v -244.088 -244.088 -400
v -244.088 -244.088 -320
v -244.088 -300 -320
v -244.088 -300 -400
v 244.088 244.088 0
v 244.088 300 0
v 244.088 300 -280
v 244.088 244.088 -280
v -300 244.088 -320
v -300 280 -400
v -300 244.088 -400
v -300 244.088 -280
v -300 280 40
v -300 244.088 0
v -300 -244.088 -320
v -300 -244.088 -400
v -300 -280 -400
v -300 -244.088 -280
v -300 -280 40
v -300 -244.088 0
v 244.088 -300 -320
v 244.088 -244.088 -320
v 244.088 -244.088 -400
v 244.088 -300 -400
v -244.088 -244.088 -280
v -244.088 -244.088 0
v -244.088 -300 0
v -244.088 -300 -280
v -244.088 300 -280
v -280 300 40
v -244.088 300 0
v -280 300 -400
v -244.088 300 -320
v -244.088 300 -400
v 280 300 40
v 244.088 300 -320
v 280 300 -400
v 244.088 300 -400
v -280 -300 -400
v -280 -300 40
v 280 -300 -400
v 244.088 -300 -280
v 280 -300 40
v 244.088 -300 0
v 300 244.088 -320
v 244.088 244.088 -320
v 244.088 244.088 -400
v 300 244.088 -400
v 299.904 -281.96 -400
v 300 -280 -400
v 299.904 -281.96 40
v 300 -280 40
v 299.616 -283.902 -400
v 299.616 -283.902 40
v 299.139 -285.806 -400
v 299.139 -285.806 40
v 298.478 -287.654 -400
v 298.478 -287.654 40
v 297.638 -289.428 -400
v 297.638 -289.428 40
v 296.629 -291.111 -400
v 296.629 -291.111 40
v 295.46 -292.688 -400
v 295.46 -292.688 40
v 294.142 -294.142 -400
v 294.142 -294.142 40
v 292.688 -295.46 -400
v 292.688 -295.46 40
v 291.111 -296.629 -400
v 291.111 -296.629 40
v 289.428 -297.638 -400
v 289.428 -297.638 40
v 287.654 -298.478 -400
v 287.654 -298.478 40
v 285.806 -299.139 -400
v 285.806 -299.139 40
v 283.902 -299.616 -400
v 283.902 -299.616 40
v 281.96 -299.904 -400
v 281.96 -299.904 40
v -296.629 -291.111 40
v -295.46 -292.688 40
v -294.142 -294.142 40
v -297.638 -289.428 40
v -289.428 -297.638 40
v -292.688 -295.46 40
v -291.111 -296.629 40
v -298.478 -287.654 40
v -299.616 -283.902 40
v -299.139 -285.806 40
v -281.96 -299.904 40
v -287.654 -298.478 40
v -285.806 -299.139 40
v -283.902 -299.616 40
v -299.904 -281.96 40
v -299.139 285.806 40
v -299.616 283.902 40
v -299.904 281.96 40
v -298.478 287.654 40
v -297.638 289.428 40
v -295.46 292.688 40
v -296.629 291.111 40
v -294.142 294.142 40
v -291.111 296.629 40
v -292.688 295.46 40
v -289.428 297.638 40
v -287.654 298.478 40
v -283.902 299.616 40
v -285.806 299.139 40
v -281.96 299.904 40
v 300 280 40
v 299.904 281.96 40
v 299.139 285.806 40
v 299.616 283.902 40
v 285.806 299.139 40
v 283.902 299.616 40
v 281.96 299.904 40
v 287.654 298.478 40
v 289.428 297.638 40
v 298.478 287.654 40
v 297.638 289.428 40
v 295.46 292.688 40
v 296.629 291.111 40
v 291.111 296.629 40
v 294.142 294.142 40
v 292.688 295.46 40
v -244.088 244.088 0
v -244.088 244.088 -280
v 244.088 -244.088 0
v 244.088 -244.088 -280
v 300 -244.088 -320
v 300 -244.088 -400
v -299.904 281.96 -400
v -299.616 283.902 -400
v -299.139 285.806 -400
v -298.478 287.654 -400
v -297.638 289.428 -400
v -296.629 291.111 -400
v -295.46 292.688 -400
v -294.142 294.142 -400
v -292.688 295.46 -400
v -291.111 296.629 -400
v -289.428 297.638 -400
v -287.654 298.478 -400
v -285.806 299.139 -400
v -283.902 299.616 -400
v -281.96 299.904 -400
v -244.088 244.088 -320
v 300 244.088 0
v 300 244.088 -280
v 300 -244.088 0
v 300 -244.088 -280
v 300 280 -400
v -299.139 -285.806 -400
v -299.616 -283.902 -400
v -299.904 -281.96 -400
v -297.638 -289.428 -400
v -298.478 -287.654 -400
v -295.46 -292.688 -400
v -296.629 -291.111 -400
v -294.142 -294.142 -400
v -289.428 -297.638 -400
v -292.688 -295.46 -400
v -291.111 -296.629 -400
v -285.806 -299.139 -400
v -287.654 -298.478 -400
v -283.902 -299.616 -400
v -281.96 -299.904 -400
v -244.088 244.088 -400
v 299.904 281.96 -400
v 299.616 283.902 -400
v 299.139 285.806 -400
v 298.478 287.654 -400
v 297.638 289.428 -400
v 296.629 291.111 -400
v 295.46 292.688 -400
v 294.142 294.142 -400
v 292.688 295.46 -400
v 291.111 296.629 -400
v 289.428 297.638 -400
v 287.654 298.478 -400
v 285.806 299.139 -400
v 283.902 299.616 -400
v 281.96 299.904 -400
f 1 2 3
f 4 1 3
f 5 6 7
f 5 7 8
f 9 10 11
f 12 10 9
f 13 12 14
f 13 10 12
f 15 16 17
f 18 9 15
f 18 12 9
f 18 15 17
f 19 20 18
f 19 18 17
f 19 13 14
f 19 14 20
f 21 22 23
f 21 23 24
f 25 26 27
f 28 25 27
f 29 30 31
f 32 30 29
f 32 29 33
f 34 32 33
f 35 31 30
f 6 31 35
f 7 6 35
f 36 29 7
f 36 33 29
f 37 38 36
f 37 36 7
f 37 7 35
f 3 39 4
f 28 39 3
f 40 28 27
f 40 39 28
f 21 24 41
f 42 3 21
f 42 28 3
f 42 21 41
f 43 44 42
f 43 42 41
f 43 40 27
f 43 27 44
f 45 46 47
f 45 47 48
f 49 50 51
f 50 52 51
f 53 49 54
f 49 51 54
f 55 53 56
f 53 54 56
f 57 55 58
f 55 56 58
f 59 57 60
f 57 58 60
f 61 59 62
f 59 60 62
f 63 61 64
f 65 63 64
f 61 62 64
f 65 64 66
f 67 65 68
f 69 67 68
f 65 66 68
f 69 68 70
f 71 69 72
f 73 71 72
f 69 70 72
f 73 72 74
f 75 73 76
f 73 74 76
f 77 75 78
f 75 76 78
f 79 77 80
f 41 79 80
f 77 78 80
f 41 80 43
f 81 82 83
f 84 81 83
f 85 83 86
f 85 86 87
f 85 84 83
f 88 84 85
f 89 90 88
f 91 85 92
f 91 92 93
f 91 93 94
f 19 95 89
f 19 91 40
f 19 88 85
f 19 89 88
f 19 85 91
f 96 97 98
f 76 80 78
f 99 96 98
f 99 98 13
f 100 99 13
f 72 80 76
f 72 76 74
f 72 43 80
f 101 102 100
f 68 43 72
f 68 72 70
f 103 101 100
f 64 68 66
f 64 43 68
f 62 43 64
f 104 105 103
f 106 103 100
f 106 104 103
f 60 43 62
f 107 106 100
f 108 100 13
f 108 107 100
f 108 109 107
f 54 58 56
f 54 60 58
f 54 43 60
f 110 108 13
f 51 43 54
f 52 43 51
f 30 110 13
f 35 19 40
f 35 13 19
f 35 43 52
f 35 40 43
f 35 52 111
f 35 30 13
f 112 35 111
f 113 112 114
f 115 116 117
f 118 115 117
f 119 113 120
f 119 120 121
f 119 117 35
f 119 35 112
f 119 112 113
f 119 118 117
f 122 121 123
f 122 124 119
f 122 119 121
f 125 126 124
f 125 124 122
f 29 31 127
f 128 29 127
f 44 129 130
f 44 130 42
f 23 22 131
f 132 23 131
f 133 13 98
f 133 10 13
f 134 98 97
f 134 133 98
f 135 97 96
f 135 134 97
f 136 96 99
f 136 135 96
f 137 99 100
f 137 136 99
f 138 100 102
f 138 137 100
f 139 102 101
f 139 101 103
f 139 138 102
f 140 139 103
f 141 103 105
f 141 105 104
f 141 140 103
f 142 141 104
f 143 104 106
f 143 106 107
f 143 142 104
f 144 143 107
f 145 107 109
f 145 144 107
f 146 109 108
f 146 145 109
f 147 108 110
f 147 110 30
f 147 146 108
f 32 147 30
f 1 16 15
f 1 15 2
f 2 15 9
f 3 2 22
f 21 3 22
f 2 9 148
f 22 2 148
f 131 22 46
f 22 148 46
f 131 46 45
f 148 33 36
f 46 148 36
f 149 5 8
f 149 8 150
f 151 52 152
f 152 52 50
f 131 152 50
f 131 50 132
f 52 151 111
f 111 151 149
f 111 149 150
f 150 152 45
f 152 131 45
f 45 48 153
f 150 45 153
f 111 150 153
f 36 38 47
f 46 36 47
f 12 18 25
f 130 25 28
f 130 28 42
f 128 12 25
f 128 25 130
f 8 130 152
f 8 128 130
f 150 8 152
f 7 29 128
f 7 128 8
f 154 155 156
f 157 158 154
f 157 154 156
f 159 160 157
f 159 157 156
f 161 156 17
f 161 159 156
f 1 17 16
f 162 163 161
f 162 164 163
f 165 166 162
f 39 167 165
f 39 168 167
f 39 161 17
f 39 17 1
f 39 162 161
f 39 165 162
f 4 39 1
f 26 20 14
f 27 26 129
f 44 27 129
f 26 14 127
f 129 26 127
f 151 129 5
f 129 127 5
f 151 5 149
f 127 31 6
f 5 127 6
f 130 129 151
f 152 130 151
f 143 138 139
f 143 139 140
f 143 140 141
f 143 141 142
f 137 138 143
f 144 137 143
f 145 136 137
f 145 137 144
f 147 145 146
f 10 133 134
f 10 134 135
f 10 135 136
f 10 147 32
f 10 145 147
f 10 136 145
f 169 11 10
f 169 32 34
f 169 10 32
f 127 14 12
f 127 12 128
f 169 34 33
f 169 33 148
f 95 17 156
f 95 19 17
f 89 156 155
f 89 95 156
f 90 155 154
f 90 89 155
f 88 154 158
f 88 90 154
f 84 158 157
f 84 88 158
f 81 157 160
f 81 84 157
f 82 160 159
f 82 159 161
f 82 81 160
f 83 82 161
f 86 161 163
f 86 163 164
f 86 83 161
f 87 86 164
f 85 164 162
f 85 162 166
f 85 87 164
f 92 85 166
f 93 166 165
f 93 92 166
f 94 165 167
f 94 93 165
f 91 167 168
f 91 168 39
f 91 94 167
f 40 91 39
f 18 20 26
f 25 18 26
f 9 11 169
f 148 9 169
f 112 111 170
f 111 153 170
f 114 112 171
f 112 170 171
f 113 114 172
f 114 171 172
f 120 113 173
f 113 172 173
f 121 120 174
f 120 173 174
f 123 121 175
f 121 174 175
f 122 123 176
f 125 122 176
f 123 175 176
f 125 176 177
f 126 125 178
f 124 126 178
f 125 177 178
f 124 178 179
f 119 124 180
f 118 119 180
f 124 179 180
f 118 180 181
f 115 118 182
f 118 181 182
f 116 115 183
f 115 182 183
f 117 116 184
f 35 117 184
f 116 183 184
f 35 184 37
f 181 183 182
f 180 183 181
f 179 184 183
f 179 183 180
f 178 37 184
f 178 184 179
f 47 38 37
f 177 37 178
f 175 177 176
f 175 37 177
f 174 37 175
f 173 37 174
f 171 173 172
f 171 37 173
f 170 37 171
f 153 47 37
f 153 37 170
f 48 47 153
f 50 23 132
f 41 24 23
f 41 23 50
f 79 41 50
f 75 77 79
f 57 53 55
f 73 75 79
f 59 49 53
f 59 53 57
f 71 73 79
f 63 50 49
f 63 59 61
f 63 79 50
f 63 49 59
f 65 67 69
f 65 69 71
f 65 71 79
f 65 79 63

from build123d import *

# Parameters (mm, degrees)
F0_W     = 600
F0_H     = 600
F1_DEPTH = 40
F2_W     = 55.912304
F2_H     = 55.912304
F3_DEPTH = 400
F5_W     = 600
F5_H     = 600
F6_DEPTH = 40
F7_R     = 20


with BuildPart() as f1:
    # F0 (on Top) → F1 (new body)
    with BuildSketch(Plane.XY):
        Rectangle(F0_W, F0_H)
    extrude(amount=F1_DEPTH)

    # F2 (on face) → F3 (join)
    with BuildSketch(Plane(origin=(0, 0, 0), x_dir=(1, 0, 0), z_dir=(0, 0, -1))):
        with Locations((-272.043848, 272.043848)):
            Rectangle(F2_W, F2_H)
        with Locations((272.043848, 272.043848)):
            Rectangle(F2_W, F2_H)
        with Locations((272.043848, -272.043848)):
            Rectangle(F2_W, F2_H)
        with Locations((-272.043848, -272.043848)):
            Rectangle(F2_W, F2_H)
    extrude(amount=F3_DEPTH)

    # F5 (on offset) → F6 (join)
    with BuildSketch(Plane.XY.offset(-280)):
        Rectangle(F5_W, F5_H)
    extrude(amount=-F6_DEPTH)

    # F7
    f7_edges = [f1.edges().sort_by_distance(p)[0] for p in [
        (300, -300, -180),
        (-300, -300, -180),
        (300, 300, -180),
        (-300, 300, -180),
    ]]
    fillet(f7_edges, radius=F7_R)


solid = f1.part
